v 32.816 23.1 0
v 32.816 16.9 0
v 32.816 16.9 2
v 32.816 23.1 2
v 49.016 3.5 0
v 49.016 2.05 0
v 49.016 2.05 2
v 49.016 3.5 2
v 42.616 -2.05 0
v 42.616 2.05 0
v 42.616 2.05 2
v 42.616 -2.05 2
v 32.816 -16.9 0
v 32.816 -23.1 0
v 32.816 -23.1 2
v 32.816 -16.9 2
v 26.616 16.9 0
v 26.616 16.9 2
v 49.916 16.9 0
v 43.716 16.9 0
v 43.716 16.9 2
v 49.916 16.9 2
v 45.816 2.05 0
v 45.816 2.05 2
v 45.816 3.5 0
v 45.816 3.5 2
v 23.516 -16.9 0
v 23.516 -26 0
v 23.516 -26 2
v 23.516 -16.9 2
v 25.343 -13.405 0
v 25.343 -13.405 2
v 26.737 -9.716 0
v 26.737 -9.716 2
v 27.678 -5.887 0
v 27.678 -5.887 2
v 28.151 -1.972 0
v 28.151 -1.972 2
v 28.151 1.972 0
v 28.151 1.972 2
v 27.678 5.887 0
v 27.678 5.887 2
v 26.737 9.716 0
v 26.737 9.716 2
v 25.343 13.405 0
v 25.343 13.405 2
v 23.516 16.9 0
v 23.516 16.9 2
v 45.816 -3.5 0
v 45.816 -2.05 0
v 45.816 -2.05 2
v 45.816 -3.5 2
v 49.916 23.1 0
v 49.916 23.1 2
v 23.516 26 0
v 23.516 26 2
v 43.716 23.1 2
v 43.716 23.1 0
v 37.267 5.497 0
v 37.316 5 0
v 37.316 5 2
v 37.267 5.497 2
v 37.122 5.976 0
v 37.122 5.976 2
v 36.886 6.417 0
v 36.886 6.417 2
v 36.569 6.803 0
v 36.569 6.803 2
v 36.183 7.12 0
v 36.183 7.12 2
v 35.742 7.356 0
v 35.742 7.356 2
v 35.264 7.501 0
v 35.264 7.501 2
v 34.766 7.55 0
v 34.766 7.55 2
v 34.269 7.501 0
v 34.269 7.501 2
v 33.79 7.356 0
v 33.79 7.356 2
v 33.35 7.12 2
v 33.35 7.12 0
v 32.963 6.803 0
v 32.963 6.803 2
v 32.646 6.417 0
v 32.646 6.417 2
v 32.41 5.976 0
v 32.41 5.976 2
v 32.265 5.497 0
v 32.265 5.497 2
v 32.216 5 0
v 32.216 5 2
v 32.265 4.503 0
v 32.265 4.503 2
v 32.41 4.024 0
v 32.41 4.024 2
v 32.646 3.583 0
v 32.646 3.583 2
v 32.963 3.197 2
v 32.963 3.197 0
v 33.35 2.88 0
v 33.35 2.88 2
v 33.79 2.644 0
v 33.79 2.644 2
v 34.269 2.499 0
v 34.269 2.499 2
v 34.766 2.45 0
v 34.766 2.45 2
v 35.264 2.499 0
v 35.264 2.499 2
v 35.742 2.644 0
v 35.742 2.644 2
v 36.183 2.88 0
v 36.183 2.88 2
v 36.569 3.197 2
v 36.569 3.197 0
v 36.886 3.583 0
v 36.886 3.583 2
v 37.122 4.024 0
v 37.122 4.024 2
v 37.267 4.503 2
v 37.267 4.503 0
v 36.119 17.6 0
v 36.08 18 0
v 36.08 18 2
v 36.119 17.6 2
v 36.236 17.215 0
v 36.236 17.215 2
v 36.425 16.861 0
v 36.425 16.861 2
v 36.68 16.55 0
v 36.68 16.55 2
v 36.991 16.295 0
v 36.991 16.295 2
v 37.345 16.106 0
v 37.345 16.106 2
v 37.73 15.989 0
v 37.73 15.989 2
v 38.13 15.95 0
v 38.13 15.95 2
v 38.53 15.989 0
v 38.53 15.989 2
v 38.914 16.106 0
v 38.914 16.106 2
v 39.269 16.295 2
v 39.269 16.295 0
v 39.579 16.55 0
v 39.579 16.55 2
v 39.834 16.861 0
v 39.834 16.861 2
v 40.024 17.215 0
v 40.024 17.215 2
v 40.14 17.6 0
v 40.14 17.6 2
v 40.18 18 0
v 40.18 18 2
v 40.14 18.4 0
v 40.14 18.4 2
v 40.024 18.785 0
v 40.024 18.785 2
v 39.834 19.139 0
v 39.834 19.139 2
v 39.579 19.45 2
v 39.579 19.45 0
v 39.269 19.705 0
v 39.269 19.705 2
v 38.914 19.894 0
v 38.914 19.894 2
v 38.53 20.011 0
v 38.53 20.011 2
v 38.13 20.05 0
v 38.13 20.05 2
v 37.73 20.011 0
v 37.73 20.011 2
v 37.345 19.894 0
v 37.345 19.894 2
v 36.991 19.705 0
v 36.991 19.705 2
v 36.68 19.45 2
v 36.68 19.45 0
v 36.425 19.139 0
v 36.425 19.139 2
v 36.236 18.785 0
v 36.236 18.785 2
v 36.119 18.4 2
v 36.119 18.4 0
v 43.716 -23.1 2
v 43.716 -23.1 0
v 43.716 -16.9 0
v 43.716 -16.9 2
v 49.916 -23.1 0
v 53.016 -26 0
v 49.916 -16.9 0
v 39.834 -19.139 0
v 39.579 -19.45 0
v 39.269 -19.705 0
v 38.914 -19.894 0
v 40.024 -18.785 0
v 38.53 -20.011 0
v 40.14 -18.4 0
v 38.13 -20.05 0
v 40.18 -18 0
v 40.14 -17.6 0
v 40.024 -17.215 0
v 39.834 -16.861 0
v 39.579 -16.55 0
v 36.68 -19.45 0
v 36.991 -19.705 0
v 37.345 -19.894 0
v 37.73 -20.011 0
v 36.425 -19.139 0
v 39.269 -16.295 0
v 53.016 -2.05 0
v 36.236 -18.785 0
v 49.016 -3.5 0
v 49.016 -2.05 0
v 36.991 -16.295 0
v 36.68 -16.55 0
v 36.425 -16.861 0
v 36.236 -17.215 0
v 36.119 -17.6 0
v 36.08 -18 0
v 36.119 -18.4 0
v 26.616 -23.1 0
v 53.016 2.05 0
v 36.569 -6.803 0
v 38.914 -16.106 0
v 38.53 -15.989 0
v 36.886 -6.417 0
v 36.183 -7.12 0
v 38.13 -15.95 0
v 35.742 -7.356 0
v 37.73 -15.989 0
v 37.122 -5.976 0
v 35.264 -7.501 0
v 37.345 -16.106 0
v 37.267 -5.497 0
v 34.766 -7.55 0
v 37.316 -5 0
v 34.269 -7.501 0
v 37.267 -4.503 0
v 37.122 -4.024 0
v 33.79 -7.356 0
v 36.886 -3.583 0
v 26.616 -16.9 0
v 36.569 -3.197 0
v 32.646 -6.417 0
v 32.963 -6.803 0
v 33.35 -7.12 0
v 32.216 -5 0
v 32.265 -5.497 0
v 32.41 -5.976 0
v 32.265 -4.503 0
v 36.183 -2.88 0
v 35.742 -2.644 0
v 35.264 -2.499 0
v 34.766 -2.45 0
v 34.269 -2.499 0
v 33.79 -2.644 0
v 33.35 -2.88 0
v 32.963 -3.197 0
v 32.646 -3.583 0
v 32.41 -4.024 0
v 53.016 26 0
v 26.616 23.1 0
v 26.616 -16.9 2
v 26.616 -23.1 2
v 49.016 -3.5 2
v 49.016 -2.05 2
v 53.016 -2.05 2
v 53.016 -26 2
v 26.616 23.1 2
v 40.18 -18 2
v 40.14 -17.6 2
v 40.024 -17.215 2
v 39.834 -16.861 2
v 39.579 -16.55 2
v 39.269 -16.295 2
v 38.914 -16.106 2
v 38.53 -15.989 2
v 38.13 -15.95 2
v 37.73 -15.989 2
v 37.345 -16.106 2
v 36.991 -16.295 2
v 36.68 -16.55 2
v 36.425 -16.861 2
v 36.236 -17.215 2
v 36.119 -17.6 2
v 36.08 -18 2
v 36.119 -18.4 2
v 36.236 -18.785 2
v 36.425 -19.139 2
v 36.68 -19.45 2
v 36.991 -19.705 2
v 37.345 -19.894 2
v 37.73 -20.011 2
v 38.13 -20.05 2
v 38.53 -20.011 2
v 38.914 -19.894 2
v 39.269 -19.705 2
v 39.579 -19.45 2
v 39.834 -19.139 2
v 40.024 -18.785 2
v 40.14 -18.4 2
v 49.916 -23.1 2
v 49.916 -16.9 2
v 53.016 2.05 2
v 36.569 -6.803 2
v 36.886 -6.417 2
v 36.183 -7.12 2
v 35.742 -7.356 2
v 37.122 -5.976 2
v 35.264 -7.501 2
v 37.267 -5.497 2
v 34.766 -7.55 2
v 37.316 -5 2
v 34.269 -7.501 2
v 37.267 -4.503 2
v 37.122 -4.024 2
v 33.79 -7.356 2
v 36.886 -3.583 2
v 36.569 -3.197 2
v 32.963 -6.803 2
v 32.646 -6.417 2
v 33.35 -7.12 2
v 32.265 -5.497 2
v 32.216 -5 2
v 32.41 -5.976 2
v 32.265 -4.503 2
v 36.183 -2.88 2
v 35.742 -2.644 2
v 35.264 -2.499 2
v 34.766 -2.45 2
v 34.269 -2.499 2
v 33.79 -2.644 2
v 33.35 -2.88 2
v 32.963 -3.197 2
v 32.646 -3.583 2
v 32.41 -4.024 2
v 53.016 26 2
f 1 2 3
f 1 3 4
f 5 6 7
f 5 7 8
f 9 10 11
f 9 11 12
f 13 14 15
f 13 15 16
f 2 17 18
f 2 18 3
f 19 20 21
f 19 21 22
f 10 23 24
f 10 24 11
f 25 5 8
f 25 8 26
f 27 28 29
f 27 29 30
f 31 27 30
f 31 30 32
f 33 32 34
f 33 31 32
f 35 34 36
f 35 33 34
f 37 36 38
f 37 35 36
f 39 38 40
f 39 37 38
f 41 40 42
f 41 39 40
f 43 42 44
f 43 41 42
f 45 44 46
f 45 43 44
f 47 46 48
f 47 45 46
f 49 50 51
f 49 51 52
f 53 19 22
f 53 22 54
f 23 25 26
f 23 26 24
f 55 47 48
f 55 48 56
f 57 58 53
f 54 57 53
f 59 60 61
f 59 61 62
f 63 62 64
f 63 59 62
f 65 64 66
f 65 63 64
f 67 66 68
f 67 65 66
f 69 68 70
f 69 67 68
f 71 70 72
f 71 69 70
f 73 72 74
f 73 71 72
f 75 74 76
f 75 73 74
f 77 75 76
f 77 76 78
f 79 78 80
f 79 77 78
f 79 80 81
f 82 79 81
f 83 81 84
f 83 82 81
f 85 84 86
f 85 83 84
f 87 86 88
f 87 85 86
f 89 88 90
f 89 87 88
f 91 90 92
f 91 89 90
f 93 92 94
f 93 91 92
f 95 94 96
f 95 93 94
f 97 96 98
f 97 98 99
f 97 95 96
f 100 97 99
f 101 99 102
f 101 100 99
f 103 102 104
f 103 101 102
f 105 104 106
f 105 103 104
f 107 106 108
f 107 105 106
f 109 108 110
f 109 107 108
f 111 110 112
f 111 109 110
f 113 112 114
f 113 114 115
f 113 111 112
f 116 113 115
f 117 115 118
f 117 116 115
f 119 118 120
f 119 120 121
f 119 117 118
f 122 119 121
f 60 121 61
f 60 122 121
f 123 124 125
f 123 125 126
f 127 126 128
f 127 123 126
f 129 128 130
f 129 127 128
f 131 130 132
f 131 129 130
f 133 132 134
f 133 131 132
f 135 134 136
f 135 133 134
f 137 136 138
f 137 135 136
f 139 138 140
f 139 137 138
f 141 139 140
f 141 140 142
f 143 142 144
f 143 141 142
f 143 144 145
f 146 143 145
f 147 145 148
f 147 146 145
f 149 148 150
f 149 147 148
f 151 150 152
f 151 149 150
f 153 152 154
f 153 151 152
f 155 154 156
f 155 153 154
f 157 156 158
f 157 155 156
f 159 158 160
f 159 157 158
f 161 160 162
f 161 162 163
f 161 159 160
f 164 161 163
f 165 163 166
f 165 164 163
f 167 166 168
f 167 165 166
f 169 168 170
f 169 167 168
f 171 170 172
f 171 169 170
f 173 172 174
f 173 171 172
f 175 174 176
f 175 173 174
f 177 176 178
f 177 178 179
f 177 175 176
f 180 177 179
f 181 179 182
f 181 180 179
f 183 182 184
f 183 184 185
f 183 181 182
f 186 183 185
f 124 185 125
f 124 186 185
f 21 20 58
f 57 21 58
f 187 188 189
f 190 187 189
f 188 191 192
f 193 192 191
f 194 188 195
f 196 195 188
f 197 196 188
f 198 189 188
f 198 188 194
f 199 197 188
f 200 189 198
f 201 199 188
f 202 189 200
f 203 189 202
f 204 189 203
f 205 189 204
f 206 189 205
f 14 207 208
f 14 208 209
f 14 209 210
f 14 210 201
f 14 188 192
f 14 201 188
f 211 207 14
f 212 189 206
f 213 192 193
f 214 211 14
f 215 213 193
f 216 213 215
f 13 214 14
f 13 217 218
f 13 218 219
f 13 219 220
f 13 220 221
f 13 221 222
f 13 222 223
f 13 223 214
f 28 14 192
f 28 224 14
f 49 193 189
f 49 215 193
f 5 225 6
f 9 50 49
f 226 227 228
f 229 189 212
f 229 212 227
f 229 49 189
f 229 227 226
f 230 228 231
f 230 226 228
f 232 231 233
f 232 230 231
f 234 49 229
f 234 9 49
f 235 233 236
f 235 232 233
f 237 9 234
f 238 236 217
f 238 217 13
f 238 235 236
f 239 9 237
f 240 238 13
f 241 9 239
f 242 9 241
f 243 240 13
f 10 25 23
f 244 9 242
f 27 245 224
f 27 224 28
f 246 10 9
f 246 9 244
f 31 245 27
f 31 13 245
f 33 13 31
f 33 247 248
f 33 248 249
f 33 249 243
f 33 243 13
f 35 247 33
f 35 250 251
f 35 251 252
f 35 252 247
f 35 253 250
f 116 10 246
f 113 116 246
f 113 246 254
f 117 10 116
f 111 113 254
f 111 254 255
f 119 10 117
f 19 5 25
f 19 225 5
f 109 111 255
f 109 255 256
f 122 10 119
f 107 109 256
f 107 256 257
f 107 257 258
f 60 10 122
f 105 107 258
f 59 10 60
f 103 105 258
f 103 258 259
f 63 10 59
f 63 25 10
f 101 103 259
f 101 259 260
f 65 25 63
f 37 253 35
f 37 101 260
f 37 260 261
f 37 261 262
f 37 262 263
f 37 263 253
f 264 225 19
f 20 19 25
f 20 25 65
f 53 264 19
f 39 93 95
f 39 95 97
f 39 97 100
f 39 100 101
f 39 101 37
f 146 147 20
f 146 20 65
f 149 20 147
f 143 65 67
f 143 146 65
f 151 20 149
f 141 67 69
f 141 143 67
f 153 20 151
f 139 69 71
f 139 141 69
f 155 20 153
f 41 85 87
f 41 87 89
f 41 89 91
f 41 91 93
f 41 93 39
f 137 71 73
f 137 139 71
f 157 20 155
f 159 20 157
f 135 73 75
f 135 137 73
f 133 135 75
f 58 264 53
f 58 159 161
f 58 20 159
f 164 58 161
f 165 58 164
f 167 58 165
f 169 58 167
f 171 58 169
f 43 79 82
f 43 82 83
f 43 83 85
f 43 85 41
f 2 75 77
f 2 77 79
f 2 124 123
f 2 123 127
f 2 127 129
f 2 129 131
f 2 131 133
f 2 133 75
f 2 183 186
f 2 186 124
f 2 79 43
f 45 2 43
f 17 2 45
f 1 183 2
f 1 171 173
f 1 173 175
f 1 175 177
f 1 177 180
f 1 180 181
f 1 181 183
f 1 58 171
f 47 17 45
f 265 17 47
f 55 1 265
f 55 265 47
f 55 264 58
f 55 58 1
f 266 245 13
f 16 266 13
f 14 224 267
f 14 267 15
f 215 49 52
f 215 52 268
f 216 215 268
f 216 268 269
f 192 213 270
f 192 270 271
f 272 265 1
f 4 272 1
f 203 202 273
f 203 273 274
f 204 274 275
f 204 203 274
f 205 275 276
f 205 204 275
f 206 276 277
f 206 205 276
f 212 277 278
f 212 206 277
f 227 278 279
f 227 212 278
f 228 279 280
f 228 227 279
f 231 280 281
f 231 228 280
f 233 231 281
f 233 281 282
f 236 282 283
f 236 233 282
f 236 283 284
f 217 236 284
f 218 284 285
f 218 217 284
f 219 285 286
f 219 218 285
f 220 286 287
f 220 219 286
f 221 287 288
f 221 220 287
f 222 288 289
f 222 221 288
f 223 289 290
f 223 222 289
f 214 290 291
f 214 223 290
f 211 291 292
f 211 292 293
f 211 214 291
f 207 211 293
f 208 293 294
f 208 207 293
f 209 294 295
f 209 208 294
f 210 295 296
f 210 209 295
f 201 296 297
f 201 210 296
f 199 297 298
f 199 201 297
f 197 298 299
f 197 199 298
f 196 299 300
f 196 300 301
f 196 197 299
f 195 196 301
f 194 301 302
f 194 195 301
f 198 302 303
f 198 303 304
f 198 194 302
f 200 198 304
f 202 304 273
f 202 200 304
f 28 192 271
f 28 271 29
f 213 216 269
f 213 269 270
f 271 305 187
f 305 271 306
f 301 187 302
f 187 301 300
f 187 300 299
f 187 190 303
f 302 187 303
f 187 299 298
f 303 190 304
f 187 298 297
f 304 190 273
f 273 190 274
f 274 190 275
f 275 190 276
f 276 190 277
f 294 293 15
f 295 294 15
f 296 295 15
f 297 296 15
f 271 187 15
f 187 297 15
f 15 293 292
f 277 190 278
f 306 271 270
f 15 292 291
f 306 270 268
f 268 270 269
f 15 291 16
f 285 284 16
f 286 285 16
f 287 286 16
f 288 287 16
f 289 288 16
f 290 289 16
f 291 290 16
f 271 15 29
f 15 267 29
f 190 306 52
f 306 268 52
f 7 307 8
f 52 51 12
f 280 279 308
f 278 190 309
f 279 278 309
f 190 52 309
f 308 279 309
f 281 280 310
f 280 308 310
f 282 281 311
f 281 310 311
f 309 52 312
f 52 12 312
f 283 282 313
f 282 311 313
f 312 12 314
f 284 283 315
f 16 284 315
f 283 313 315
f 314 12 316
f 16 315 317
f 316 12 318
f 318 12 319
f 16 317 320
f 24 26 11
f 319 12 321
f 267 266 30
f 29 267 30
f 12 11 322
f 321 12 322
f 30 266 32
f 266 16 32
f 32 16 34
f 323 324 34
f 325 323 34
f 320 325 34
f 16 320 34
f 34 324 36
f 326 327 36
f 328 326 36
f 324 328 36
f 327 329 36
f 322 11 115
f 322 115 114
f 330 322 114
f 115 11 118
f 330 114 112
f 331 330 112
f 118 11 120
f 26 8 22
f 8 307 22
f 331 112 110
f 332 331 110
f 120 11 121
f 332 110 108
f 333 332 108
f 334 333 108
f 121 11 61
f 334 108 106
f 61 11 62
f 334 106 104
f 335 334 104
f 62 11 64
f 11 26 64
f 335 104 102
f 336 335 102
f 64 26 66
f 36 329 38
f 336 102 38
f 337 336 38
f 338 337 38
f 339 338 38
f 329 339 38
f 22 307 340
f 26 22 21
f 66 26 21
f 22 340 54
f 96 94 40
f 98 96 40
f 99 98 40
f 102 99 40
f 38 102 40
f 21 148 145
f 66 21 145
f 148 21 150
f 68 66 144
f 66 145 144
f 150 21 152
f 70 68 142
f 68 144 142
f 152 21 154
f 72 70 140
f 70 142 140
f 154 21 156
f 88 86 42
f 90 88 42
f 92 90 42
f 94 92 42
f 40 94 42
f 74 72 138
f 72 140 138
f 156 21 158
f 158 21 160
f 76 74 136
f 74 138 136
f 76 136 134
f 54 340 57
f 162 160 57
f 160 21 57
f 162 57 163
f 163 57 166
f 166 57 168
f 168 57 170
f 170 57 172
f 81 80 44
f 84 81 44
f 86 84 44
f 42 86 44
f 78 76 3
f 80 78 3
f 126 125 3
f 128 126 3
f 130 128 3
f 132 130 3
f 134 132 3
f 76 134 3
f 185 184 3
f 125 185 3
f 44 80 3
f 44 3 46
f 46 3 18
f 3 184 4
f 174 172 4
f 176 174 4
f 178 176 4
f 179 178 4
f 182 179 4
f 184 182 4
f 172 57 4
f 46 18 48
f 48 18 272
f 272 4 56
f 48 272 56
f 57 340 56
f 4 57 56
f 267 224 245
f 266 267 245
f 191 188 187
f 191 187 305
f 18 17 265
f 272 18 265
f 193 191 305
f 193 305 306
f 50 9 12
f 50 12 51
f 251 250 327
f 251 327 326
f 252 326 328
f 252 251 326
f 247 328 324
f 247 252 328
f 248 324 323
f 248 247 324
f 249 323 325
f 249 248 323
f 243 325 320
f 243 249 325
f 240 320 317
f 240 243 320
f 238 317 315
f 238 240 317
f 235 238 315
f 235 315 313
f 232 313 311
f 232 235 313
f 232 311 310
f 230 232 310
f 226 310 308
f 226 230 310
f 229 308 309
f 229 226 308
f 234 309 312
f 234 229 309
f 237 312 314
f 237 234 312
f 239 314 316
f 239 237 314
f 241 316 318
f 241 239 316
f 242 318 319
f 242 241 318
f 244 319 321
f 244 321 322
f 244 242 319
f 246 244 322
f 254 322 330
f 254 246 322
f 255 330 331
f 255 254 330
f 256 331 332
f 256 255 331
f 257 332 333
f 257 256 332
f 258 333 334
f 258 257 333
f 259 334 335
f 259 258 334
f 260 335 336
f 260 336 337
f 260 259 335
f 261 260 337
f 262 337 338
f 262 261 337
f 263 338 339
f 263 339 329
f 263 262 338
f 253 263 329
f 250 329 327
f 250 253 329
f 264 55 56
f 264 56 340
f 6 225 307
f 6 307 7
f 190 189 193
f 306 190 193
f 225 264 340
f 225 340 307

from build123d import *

# Parameters (mm, degrees)
SKETCH_1_R      = 2.55
SKETCH_1_R_2    = 2.05
SKETCH_1_W      = 6.2
SKETCH_1_H      = 6.2
EXTRUDE_1_DEPTH = 2


with BuildPart() as part:
    # 草图1 → 凸台-拉伸1 (new body)
    with BuildSketch(Plane.XY):
        with BuildLine():
            Line((53.016222961, -26), (23.516222961, -26))
            Line((23.516222961, -26), (23.516222961, -16.9))
            ThreePointArc((23.516222961, -16.9), (28.210668367, 0), (23.516222961, 16.9))
            Line((23.516222961, 16.9), (23.516222961, 26))
            Line((23.516222961, 26), (53.016222961, 26))
            Line((53.016222961, 26), (53.016222961, 2.05))
            Line((53.016222961, 2.05), (49.016222961, 2.05))
            Line((49.016222961, 2.05), (49.016222961, 3.5))
            Line((49.016222961, 3.5), (45.816222961, 3.5))
            Line((45.816222961, 3.5), (45.816222961, 2.05))
            Line((45.816222961, 2.05), (42.616222961, 2.05))
            Line((42.616222961, 2.05), (42.616222961, -2.05))
            Line((42.616222961, -2.05), (45.816222961, -2.05))
            Line((45.816222961, -2.05), (45.816222961, -3.5))
            Line((45.816222961, -3.5), (49.016222961, -3.5))
            Line((49.016222961, -3.5), (49.016222961, -2.05))
            Line((49.016222961, -2.05), (53.016222961, -2.05))
            Line((53.016222961, -2.05), (53.016222961, -26))
        make_face()
        with Locations((34.766222961, 5)):
            Circle(SKETCH_1_R, mode=Mode.SUBTRACT)
        with Locations((38.129788434, -18)):
            Circle(SKETCH_1_R_2, mode=Mode.SUBTRACT)
        with Locations(Location((34.766222961, -5, 0), (0, 0, 180))):
            Circle(SKETCH_1_R, mode=Mode.SUBTRACT)
        with Locations(Location((38.129788434, 18, 0), (0, 0, 180))):
            Circle(SKETCH_1_R_2, mode=Mode.SUBTRACT)
        with Locations((46.816222961, -20)):
            Rectangle(SKETCH_1_W, SKETCH_1_H, mode=Mode.SUBTRACT)
        with Locations((29.716222961, -20)):
            Rectangle(SKETCH_1_W, SKETCH_1_H, mode=Mode.SUBTRACT)
        with Locations((29.716222961, 20)):
            Rectangle(SKETCH_1_W, SKETCH_1_H, mode=Mode.SUBTRACT)
        with Locations((46.816222961, 20)):
            Rectangle(SKETCH_1_W, SKETCH_1_H, mode=Mode.SUBTRACT)
    extrude(amount=EXTRUDE_1_DEPTH)


solid = part.part
